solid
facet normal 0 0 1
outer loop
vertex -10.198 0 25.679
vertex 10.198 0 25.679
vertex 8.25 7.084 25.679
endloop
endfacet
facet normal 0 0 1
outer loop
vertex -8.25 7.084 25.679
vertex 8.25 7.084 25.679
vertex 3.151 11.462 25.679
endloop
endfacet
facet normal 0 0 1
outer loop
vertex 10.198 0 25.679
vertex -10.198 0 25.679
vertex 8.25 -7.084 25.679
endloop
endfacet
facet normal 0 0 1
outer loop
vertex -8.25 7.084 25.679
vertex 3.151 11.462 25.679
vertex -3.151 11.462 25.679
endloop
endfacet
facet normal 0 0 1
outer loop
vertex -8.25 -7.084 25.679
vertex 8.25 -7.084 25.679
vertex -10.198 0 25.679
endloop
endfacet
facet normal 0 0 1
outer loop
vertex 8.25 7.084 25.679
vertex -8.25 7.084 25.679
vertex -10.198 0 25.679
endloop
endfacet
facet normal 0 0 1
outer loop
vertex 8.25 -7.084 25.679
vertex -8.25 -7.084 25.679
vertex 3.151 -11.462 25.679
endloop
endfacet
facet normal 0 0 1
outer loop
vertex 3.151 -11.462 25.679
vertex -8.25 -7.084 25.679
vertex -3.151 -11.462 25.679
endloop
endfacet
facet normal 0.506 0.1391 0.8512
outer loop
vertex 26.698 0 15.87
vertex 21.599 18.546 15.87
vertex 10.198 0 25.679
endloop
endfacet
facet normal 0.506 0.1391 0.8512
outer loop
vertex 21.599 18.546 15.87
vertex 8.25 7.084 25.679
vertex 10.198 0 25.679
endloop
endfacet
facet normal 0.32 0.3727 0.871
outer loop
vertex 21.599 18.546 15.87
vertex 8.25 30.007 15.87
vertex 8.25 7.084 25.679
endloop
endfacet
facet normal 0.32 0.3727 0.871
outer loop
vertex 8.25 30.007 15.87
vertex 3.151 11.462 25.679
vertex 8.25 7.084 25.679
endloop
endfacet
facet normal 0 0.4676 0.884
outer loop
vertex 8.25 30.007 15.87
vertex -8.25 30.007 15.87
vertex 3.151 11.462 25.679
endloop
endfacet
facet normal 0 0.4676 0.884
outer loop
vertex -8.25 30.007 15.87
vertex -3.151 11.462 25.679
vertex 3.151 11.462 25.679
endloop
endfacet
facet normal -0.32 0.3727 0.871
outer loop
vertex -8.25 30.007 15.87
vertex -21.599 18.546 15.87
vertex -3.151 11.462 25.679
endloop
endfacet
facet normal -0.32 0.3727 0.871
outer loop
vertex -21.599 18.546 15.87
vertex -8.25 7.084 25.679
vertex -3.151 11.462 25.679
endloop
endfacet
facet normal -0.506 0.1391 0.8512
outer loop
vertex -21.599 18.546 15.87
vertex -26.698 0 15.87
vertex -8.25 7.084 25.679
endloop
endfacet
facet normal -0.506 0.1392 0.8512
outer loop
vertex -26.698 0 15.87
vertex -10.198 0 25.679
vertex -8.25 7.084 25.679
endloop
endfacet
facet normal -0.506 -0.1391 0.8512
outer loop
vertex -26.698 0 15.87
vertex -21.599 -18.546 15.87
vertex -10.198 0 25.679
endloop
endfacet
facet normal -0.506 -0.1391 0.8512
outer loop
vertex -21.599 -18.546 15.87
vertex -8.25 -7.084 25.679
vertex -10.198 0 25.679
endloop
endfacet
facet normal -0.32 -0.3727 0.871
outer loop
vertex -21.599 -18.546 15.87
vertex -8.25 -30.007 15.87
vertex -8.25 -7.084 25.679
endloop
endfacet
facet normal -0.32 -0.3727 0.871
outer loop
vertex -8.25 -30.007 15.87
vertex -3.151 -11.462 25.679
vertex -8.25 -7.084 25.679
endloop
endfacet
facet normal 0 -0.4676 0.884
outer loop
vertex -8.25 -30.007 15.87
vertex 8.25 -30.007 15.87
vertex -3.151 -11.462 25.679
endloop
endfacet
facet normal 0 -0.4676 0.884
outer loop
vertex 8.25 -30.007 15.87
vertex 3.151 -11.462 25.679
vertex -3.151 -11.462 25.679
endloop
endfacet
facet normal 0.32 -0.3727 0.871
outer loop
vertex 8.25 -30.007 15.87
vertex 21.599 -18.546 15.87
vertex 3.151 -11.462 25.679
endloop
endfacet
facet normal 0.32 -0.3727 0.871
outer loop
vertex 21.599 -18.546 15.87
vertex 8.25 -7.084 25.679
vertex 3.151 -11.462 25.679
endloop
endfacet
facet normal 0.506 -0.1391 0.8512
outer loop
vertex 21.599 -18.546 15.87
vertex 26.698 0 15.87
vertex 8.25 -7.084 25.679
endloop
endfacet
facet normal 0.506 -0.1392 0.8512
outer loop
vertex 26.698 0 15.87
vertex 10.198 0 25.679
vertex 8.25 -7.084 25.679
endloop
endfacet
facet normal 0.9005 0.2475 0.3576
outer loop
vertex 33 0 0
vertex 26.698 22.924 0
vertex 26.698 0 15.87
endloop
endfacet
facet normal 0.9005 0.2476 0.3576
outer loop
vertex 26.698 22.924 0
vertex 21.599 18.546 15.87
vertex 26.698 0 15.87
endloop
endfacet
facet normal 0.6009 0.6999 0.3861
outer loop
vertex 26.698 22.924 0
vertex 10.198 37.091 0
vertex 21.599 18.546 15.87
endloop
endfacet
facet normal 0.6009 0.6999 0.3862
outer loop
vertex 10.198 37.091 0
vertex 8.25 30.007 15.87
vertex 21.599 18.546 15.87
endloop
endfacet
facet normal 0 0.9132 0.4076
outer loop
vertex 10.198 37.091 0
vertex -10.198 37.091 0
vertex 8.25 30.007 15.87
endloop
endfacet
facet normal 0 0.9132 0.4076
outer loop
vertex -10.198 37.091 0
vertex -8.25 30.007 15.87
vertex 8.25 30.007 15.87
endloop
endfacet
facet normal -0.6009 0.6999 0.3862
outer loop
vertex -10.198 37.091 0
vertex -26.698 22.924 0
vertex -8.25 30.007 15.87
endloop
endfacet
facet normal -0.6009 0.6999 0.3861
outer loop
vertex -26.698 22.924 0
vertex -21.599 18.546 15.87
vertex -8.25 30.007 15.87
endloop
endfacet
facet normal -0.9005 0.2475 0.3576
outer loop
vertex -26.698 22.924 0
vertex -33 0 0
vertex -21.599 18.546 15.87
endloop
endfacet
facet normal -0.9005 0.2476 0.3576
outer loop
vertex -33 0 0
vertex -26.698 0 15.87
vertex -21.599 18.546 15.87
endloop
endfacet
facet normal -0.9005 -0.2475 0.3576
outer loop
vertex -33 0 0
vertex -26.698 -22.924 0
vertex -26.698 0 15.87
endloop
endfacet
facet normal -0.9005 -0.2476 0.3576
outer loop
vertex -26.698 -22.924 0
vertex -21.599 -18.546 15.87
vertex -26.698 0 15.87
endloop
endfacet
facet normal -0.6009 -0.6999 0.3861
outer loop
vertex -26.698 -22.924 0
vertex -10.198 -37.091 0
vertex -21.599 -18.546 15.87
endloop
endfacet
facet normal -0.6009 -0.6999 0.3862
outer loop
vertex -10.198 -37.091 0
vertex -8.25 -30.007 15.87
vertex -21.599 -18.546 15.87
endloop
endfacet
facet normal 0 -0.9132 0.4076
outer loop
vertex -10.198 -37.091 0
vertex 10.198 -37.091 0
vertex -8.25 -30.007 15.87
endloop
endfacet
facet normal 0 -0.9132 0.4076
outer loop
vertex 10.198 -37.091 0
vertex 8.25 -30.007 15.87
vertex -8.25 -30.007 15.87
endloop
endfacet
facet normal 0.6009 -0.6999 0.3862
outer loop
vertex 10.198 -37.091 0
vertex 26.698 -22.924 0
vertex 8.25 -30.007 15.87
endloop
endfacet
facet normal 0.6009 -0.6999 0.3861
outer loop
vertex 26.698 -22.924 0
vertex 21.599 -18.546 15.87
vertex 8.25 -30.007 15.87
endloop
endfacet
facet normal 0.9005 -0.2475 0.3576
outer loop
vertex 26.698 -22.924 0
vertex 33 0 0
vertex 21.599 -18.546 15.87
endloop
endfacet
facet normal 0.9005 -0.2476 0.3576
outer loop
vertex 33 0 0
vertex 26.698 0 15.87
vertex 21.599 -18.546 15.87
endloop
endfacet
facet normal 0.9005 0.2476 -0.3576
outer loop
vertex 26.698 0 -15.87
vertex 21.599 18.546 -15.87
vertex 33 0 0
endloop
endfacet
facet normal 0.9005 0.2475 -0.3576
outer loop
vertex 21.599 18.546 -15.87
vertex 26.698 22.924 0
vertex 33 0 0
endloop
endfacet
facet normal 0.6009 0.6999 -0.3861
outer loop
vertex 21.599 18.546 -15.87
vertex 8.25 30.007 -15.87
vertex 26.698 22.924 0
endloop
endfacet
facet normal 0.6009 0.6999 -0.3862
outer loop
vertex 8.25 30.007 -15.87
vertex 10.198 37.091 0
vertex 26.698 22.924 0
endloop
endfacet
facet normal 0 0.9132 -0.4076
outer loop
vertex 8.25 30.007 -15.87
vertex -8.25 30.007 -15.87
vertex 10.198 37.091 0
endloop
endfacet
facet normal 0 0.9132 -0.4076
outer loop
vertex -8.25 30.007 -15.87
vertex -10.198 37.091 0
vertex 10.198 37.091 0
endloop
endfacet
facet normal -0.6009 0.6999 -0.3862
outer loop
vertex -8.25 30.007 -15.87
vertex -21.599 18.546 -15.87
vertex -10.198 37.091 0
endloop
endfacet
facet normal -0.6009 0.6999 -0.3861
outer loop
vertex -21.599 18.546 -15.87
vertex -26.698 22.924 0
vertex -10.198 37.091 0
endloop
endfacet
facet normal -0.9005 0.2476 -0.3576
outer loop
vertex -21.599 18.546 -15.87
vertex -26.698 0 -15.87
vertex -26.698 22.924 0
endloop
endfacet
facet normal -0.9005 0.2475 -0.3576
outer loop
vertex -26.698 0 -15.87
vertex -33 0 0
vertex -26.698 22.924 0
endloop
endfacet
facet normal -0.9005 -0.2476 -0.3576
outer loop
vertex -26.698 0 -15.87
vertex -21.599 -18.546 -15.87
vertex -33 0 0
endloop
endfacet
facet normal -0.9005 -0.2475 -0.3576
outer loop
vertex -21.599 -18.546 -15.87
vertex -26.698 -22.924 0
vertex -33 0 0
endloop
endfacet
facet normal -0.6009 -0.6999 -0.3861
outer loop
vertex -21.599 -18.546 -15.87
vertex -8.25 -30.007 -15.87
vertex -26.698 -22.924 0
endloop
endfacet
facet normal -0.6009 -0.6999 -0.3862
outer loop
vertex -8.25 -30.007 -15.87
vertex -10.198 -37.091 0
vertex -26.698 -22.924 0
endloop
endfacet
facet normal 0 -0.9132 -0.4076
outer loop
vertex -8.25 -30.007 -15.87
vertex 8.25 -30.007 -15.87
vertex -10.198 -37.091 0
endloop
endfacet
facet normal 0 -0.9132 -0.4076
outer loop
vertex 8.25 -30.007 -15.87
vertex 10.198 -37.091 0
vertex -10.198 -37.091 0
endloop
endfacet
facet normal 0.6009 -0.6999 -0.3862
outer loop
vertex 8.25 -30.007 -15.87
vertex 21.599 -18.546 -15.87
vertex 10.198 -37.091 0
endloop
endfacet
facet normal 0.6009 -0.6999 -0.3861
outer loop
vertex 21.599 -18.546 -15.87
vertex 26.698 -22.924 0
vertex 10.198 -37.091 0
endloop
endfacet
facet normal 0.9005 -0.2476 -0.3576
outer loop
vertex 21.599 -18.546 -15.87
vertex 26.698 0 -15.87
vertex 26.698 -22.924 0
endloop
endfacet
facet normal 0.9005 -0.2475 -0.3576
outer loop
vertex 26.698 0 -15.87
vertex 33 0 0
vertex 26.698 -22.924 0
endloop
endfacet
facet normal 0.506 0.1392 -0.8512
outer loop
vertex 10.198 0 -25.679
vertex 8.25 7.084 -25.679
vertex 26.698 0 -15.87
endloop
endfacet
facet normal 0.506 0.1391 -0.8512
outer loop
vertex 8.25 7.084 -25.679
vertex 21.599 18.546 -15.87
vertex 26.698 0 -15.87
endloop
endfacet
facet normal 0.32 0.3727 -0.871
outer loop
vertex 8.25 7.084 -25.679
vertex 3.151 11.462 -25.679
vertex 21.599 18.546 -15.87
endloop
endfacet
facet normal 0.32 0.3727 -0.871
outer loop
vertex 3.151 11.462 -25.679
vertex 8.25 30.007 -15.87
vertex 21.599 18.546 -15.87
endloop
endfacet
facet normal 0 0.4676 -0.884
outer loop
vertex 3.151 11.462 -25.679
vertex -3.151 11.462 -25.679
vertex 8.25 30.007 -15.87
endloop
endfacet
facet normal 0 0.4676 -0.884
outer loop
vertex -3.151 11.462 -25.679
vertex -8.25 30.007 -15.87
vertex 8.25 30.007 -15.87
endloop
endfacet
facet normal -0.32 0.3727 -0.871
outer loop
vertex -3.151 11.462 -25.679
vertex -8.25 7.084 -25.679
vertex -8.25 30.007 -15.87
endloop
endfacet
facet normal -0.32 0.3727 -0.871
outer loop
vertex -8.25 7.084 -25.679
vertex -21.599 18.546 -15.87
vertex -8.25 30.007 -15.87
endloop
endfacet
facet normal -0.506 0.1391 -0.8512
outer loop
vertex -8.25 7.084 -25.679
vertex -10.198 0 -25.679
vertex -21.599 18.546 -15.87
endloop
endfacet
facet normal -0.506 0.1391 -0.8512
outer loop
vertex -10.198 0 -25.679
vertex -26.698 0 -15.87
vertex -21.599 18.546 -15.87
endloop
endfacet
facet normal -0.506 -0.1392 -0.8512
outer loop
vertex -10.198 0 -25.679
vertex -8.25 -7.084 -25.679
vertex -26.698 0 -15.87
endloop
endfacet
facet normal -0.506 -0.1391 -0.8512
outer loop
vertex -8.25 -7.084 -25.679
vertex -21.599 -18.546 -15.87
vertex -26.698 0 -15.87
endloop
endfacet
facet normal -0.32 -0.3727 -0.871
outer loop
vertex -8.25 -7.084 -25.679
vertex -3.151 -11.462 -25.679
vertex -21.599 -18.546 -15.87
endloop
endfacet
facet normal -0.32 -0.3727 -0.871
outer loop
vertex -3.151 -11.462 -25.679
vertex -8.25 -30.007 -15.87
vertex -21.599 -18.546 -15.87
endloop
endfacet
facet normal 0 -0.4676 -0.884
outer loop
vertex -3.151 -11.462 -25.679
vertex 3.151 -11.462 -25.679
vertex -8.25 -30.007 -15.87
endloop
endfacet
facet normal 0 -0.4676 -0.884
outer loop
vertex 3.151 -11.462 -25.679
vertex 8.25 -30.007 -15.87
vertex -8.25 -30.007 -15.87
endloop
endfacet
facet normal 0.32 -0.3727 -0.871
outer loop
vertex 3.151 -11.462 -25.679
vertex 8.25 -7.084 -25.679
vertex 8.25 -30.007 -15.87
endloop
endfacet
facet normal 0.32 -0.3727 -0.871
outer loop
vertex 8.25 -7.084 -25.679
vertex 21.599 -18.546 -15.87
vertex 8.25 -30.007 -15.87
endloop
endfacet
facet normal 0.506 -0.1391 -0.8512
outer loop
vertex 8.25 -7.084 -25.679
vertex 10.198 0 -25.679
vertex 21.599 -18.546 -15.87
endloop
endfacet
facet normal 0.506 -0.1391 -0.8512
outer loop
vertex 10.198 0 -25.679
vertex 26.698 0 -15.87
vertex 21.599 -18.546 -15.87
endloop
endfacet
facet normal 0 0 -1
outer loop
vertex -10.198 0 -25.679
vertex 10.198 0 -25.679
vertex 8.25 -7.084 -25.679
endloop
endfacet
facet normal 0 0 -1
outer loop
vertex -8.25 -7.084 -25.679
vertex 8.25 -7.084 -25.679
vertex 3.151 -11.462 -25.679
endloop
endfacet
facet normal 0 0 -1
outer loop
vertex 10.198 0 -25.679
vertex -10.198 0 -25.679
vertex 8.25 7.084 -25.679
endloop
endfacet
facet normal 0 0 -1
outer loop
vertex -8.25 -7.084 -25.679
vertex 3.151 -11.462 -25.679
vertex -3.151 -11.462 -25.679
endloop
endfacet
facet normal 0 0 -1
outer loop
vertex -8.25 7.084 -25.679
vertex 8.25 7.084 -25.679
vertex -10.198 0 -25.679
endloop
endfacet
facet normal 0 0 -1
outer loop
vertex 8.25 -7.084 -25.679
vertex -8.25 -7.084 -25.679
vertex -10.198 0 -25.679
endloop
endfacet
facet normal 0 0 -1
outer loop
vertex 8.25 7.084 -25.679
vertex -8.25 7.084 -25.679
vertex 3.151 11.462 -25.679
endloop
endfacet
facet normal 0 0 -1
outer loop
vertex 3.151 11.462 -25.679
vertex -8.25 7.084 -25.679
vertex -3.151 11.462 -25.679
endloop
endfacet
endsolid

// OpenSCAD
// Generated by SolidPython 1.0.1 on 2020-07-29 00:46:49


scale(v = [11, 13, 9]) {
	sphere(r = 3);
}
/***********************************************
*********      SolidPython code:      **********
************************************************
 
# import packages: SolidPython
from solid import *
from solid.utils import *
from itertools import chain, combinations, permutations


class Resize:

    def __init__(self, scad_file):
        self.scad_file = scad_file
        #self.scad_file = import_scad(scad_file)
        # cone/cylinder param:
        self.r1 = 0
        self.r2 = 0
        self.h = 0
        # rectangular prism param:
        self.w = 0
        self.l = 0
        # ellipse param:
        self.r = 0

    # import OpenScad code (file name corresponds to shape)


    # classify shape + parameters
    def assign(self, param1, param2, param3):
        if self.scad_file == 'cone.scad':
            self.r1 = param1
            self.r2 = param2
            self.h = param3
        elif self.scad_file == 'cylinder.scad':
            self.r1 = param1
            self.r2 = param2
            self.h = param3
        elif self.scad_file == 'rectangularPrism.scad':
            self.h = param1
            self.l = param2
            self.w = param3
        else:
            self.r = param1
            self.h = param2

    # resize parameters
    def iterate(self):
        x = range(3, 20, 2)
        i = 1
        if self.scad_file == 'cone.scad':
            tempList = list(permutations(x, 2))
            for temp in tempList:
                param1 = temp[0]
                param2 = temp[1]
                filepath = 'produced_scad_files/' + 'cone' + str(param1) + '_' + str(param2) + '_' + '.scad'
                scad_render_to_file(cylinder(h=param1, r1=param2, r2=0), filepath)

        elif self.scad_file == 'cylinder.scad':
            tempList = list(permutations(x, 3))
            for temp in tempList:
                param1 = temp[0]
                param2 = temp[1]
                filepath = 'produced_scad_files/' + 'cylinder' + str(param1) + '_' + str(param2) + '_' + '.scad'
                scad_render_to_file(cylinder(h=param1, r1=param2, r2=param2), filepath)

        elif self.scad_file == 'rectangularPrism.scad':
            tempList = list(permutations(x, 3))
            for temp in tempList:
                param1 = temp[0]
                param2 = temp[1]
                param3 = temp[2]
                filepath = 'produced_scad_files/' + 'rectangularPrism' + str(param1) + '_' + str(param2) + '_' + str(
                    param3) + '.scad'
                scad_render_to_file(cube(size=(param1, param2, param3)), filepath)

        elif self.scad_file == 'ellipse.scad':
            tempList = list(permutations(x, 4))
            for temp in tempList:
                param1 = temp[0]
                param2 = temp[1]
                param3 = temp[2]
                param4 = temp[3]
                filepath = 'produced_scad_files/' + 'ellipse' + str(param1) + '_' + str(param2) + '_' + str(param3) + '_' + str(param4) + '.scad'
                scad_render_to_file(scale([param1, param2, param3])(sphere(r=param4)), filepath)

    def render_to_scadfile(self):
        scad_render_to_file(scad, 'example.scad') 
 
************************************************/
